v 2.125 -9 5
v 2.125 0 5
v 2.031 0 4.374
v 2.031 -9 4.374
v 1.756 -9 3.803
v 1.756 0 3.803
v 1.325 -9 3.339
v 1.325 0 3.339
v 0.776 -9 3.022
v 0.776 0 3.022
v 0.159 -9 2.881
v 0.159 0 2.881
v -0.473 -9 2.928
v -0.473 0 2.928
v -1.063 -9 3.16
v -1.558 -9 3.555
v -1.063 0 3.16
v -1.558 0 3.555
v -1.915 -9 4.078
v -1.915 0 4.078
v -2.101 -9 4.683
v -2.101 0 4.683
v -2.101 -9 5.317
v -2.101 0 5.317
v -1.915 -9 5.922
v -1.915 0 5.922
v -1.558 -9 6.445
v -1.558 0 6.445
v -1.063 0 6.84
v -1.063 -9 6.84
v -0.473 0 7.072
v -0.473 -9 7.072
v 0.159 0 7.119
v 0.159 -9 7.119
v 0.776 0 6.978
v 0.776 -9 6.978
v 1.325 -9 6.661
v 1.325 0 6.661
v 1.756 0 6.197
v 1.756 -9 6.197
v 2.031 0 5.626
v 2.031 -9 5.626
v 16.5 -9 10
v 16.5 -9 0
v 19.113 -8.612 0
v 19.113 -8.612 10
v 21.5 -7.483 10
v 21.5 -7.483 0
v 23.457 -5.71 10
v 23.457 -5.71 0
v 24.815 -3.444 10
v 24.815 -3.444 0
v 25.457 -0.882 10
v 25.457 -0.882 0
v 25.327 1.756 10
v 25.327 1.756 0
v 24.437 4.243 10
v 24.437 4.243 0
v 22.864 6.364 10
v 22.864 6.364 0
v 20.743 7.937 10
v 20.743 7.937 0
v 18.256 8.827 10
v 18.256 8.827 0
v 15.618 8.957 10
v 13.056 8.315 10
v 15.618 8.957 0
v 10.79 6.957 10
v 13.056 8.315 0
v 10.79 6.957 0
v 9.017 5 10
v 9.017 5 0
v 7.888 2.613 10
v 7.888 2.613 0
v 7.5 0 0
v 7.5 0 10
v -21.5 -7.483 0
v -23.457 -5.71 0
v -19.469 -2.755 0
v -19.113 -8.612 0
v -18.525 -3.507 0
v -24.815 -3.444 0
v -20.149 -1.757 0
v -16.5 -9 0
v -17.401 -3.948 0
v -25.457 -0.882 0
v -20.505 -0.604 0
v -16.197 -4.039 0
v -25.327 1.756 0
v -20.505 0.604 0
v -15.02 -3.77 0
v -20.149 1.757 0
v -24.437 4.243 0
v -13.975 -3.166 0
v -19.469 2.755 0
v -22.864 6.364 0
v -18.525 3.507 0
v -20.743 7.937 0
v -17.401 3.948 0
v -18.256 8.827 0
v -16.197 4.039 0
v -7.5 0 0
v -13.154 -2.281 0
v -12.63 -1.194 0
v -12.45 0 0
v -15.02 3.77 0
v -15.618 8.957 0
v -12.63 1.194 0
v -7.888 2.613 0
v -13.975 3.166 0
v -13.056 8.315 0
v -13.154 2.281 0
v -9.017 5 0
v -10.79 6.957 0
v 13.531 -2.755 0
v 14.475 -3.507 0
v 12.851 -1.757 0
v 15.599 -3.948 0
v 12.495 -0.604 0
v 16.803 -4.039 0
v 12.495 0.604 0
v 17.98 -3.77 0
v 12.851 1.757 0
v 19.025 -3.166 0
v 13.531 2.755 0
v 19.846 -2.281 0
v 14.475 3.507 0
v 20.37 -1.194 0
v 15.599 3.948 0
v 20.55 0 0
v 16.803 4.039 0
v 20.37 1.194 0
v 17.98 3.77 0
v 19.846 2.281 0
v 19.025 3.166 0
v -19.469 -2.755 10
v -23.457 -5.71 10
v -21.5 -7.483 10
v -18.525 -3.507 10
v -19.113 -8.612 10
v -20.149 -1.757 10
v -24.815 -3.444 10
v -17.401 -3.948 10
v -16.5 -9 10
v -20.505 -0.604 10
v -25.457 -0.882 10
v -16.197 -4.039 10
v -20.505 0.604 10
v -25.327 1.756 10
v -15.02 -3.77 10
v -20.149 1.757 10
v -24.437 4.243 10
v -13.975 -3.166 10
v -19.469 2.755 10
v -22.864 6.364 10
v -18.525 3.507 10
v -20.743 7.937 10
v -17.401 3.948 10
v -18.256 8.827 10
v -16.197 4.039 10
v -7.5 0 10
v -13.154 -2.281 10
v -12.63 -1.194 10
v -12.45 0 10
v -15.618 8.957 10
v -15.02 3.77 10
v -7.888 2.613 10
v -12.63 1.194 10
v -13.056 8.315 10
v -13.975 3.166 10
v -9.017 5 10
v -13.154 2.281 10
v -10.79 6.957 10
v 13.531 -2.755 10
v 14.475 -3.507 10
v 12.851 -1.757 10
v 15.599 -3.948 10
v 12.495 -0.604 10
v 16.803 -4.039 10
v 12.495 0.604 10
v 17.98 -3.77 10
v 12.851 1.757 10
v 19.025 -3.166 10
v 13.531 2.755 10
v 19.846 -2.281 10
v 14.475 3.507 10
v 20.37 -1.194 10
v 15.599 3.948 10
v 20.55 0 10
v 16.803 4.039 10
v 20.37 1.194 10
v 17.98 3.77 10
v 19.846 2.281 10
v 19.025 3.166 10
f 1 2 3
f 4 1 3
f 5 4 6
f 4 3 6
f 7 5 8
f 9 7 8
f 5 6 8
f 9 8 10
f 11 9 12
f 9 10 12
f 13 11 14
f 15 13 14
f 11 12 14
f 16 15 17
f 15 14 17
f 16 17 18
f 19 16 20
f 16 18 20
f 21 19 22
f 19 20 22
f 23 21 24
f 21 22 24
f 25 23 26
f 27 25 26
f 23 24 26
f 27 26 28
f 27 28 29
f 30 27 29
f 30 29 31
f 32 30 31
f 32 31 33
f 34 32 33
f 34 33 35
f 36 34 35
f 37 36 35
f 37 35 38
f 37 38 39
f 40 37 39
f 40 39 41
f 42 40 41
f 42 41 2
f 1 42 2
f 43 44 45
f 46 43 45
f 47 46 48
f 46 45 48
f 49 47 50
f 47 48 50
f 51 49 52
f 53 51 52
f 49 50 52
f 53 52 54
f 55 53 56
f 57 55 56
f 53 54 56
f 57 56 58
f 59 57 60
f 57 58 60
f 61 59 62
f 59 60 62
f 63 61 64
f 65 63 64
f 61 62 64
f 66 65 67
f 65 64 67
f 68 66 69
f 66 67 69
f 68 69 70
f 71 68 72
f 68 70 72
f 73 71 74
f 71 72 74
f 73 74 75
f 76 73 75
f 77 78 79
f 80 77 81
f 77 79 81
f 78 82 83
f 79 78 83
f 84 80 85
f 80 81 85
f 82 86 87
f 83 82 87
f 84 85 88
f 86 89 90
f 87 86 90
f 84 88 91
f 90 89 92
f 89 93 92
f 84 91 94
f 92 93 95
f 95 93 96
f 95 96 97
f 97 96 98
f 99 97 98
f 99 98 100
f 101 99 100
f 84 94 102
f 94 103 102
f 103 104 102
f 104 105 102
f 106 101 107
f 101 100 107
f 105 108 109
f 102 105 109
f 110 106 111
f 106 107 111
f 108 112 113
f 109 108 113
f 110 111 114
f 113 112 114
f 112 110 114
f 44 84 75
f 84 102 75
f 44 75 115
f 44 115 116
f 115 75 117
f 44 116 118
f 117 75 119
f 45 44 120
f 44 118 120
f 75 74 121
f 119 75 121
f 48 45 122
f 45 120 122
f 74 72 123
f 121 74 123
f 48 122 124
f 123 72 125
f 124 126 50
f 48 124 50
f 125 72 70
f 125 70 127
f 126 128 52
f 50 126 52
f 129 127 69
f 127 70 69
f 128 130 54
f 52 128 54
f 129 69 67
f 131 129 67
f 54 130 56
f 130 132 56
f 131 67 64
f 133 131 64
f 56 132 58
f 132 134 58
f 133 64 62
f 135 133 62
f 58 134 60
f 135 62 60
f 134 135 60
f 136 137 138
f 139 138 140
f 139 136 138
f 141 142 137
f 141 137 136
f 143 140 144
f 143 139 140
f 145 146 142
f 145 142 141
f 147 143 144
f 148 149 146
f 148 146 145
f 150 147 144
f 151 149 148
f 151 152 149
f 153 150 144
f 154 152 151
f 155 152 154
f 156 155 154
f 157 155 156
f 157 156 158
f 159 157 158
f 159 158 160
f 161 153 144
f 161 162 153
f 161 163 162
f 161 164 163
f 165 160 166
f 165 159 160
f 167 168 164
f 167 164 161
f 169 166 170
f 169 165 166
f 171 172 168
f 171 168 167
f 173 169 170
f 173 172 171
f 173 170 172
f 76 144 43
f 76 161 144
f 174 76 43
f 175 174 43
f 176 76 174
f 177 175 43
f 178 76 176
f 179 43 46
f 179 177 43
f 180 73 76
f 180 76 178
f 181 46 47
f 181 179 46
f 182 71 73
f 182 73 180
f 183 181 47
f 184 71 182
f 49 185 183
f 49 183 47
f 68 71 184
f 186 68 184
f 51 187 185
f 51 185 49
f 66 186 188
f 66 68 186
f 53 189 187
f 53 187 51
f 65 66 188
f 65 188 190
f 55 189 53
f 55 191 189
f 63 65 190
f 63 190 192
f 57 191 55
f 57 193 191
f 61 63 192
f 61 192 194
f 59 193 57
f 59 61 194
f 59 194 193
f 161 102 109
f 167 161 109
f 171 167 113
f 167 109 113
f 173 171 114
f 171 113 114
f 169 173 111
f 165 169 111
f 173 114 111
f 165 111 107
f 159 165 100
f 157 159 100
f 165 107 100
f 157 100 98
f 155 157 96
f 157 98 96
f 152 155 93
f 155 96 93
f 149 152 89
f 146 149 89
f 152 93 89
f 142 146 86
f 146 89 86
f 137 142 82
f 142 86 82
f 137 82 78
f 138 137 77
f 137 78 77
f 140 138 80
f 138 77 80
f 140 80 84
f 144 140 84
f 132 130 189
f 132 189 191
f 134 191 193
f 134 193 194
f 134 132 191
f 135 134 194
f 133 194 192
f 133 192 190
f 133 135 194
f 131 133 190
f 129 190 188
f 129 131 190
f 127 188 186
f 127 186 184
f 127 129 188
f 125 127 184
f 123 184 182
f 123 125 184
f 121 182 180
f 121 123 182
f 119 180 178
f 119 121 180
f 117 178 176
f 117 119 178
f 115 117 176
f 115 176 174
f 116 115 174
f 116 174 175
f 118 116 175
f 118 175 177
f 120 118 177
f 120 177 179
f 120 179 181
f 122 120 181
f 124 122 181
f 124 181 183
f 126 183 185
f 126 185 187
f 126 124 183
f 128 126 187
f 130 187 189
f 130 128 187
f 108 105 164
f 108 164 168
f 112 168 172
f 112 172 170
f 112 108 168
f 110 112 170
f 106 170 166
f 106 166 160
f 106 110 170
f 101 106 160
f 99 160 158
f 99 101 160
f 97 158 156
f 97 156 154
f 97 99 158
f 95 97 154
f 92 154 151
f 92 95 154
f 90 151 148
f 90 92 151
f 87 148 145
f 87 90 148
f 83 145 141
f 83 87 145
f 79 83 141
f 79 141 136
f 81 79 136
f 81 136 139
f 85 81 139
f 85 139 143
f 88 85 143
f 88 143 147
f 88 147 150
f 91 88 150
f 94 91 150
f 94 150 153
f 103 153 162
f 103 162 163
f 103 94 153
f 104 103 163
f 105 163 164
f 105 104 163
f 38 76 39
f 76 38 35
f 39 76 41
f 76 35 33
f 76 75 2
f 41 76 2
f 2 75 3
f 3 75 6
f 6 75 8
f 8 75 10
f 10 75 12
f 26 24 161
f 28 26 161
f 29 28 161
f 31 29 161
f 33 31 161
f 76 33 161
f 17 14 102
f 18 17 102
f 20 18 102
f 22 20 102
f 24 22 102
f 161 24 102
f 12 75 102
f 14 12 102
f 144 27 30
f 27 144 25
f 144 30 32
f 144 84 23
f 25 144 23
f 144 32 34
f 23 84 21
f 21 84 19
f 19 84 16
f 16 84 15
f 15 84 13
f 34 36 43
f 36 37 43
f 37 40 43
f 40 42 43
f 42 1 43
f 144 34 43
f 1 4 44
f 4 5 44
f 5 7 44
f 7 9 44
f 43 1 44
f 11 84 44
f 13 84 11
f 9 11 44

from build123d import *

# Parameters (mm, degrees)
ESBO_O1_R                = 4.05
RESSALTO_EXTRUS_O1_DEPTH = 10
ESBO_O2_R                = 2.125
CORTE_EXTRUS_O1_DEPTH    = 10


with BuildPart() as part:
    # Esboço1 → Ressalto-extrusão1 (new body)
    with BuildSketch(Plane.XY):
        with BuildLine():
            Line((-16.5, -9), (16.5, -9))
            ThreePointArc((16.5, -9), (22.863961031, 6.363961031), (7.5, 0))
            Line((7.5, 0), (-7.5, 0))
            ThreePointArc((-7.5, 0), (-22.863961031, 6.363961031), (-16.5, -9))
        make_face()
        with Locations((-16.5, 0)):
            Circle(ESBO_O1_R, mode=Mode.SUBTRACT)
        with Locations((16.5, 0)):
            Circle(ESBO_O1_R, mode=Mode.SUBTRACT)
    extrude(amount=RESSALTO_EXTRUS_O1_DEPTH)

    # Esboço2 → Corte-extrusão1 (cut)
    with BuildSketch(Plane(origin=(0, 0, 0), x_dir=(1, 0, 0), z_dir=(0, 1, 0))):
        with Locations((0, -5)):
            Circle(ESBO_O2_R)
    extrude(amount=-CORTE_EXTRUS_O1_DEPTH, mode=Mode.SUBTRACT)


solid = part.part
